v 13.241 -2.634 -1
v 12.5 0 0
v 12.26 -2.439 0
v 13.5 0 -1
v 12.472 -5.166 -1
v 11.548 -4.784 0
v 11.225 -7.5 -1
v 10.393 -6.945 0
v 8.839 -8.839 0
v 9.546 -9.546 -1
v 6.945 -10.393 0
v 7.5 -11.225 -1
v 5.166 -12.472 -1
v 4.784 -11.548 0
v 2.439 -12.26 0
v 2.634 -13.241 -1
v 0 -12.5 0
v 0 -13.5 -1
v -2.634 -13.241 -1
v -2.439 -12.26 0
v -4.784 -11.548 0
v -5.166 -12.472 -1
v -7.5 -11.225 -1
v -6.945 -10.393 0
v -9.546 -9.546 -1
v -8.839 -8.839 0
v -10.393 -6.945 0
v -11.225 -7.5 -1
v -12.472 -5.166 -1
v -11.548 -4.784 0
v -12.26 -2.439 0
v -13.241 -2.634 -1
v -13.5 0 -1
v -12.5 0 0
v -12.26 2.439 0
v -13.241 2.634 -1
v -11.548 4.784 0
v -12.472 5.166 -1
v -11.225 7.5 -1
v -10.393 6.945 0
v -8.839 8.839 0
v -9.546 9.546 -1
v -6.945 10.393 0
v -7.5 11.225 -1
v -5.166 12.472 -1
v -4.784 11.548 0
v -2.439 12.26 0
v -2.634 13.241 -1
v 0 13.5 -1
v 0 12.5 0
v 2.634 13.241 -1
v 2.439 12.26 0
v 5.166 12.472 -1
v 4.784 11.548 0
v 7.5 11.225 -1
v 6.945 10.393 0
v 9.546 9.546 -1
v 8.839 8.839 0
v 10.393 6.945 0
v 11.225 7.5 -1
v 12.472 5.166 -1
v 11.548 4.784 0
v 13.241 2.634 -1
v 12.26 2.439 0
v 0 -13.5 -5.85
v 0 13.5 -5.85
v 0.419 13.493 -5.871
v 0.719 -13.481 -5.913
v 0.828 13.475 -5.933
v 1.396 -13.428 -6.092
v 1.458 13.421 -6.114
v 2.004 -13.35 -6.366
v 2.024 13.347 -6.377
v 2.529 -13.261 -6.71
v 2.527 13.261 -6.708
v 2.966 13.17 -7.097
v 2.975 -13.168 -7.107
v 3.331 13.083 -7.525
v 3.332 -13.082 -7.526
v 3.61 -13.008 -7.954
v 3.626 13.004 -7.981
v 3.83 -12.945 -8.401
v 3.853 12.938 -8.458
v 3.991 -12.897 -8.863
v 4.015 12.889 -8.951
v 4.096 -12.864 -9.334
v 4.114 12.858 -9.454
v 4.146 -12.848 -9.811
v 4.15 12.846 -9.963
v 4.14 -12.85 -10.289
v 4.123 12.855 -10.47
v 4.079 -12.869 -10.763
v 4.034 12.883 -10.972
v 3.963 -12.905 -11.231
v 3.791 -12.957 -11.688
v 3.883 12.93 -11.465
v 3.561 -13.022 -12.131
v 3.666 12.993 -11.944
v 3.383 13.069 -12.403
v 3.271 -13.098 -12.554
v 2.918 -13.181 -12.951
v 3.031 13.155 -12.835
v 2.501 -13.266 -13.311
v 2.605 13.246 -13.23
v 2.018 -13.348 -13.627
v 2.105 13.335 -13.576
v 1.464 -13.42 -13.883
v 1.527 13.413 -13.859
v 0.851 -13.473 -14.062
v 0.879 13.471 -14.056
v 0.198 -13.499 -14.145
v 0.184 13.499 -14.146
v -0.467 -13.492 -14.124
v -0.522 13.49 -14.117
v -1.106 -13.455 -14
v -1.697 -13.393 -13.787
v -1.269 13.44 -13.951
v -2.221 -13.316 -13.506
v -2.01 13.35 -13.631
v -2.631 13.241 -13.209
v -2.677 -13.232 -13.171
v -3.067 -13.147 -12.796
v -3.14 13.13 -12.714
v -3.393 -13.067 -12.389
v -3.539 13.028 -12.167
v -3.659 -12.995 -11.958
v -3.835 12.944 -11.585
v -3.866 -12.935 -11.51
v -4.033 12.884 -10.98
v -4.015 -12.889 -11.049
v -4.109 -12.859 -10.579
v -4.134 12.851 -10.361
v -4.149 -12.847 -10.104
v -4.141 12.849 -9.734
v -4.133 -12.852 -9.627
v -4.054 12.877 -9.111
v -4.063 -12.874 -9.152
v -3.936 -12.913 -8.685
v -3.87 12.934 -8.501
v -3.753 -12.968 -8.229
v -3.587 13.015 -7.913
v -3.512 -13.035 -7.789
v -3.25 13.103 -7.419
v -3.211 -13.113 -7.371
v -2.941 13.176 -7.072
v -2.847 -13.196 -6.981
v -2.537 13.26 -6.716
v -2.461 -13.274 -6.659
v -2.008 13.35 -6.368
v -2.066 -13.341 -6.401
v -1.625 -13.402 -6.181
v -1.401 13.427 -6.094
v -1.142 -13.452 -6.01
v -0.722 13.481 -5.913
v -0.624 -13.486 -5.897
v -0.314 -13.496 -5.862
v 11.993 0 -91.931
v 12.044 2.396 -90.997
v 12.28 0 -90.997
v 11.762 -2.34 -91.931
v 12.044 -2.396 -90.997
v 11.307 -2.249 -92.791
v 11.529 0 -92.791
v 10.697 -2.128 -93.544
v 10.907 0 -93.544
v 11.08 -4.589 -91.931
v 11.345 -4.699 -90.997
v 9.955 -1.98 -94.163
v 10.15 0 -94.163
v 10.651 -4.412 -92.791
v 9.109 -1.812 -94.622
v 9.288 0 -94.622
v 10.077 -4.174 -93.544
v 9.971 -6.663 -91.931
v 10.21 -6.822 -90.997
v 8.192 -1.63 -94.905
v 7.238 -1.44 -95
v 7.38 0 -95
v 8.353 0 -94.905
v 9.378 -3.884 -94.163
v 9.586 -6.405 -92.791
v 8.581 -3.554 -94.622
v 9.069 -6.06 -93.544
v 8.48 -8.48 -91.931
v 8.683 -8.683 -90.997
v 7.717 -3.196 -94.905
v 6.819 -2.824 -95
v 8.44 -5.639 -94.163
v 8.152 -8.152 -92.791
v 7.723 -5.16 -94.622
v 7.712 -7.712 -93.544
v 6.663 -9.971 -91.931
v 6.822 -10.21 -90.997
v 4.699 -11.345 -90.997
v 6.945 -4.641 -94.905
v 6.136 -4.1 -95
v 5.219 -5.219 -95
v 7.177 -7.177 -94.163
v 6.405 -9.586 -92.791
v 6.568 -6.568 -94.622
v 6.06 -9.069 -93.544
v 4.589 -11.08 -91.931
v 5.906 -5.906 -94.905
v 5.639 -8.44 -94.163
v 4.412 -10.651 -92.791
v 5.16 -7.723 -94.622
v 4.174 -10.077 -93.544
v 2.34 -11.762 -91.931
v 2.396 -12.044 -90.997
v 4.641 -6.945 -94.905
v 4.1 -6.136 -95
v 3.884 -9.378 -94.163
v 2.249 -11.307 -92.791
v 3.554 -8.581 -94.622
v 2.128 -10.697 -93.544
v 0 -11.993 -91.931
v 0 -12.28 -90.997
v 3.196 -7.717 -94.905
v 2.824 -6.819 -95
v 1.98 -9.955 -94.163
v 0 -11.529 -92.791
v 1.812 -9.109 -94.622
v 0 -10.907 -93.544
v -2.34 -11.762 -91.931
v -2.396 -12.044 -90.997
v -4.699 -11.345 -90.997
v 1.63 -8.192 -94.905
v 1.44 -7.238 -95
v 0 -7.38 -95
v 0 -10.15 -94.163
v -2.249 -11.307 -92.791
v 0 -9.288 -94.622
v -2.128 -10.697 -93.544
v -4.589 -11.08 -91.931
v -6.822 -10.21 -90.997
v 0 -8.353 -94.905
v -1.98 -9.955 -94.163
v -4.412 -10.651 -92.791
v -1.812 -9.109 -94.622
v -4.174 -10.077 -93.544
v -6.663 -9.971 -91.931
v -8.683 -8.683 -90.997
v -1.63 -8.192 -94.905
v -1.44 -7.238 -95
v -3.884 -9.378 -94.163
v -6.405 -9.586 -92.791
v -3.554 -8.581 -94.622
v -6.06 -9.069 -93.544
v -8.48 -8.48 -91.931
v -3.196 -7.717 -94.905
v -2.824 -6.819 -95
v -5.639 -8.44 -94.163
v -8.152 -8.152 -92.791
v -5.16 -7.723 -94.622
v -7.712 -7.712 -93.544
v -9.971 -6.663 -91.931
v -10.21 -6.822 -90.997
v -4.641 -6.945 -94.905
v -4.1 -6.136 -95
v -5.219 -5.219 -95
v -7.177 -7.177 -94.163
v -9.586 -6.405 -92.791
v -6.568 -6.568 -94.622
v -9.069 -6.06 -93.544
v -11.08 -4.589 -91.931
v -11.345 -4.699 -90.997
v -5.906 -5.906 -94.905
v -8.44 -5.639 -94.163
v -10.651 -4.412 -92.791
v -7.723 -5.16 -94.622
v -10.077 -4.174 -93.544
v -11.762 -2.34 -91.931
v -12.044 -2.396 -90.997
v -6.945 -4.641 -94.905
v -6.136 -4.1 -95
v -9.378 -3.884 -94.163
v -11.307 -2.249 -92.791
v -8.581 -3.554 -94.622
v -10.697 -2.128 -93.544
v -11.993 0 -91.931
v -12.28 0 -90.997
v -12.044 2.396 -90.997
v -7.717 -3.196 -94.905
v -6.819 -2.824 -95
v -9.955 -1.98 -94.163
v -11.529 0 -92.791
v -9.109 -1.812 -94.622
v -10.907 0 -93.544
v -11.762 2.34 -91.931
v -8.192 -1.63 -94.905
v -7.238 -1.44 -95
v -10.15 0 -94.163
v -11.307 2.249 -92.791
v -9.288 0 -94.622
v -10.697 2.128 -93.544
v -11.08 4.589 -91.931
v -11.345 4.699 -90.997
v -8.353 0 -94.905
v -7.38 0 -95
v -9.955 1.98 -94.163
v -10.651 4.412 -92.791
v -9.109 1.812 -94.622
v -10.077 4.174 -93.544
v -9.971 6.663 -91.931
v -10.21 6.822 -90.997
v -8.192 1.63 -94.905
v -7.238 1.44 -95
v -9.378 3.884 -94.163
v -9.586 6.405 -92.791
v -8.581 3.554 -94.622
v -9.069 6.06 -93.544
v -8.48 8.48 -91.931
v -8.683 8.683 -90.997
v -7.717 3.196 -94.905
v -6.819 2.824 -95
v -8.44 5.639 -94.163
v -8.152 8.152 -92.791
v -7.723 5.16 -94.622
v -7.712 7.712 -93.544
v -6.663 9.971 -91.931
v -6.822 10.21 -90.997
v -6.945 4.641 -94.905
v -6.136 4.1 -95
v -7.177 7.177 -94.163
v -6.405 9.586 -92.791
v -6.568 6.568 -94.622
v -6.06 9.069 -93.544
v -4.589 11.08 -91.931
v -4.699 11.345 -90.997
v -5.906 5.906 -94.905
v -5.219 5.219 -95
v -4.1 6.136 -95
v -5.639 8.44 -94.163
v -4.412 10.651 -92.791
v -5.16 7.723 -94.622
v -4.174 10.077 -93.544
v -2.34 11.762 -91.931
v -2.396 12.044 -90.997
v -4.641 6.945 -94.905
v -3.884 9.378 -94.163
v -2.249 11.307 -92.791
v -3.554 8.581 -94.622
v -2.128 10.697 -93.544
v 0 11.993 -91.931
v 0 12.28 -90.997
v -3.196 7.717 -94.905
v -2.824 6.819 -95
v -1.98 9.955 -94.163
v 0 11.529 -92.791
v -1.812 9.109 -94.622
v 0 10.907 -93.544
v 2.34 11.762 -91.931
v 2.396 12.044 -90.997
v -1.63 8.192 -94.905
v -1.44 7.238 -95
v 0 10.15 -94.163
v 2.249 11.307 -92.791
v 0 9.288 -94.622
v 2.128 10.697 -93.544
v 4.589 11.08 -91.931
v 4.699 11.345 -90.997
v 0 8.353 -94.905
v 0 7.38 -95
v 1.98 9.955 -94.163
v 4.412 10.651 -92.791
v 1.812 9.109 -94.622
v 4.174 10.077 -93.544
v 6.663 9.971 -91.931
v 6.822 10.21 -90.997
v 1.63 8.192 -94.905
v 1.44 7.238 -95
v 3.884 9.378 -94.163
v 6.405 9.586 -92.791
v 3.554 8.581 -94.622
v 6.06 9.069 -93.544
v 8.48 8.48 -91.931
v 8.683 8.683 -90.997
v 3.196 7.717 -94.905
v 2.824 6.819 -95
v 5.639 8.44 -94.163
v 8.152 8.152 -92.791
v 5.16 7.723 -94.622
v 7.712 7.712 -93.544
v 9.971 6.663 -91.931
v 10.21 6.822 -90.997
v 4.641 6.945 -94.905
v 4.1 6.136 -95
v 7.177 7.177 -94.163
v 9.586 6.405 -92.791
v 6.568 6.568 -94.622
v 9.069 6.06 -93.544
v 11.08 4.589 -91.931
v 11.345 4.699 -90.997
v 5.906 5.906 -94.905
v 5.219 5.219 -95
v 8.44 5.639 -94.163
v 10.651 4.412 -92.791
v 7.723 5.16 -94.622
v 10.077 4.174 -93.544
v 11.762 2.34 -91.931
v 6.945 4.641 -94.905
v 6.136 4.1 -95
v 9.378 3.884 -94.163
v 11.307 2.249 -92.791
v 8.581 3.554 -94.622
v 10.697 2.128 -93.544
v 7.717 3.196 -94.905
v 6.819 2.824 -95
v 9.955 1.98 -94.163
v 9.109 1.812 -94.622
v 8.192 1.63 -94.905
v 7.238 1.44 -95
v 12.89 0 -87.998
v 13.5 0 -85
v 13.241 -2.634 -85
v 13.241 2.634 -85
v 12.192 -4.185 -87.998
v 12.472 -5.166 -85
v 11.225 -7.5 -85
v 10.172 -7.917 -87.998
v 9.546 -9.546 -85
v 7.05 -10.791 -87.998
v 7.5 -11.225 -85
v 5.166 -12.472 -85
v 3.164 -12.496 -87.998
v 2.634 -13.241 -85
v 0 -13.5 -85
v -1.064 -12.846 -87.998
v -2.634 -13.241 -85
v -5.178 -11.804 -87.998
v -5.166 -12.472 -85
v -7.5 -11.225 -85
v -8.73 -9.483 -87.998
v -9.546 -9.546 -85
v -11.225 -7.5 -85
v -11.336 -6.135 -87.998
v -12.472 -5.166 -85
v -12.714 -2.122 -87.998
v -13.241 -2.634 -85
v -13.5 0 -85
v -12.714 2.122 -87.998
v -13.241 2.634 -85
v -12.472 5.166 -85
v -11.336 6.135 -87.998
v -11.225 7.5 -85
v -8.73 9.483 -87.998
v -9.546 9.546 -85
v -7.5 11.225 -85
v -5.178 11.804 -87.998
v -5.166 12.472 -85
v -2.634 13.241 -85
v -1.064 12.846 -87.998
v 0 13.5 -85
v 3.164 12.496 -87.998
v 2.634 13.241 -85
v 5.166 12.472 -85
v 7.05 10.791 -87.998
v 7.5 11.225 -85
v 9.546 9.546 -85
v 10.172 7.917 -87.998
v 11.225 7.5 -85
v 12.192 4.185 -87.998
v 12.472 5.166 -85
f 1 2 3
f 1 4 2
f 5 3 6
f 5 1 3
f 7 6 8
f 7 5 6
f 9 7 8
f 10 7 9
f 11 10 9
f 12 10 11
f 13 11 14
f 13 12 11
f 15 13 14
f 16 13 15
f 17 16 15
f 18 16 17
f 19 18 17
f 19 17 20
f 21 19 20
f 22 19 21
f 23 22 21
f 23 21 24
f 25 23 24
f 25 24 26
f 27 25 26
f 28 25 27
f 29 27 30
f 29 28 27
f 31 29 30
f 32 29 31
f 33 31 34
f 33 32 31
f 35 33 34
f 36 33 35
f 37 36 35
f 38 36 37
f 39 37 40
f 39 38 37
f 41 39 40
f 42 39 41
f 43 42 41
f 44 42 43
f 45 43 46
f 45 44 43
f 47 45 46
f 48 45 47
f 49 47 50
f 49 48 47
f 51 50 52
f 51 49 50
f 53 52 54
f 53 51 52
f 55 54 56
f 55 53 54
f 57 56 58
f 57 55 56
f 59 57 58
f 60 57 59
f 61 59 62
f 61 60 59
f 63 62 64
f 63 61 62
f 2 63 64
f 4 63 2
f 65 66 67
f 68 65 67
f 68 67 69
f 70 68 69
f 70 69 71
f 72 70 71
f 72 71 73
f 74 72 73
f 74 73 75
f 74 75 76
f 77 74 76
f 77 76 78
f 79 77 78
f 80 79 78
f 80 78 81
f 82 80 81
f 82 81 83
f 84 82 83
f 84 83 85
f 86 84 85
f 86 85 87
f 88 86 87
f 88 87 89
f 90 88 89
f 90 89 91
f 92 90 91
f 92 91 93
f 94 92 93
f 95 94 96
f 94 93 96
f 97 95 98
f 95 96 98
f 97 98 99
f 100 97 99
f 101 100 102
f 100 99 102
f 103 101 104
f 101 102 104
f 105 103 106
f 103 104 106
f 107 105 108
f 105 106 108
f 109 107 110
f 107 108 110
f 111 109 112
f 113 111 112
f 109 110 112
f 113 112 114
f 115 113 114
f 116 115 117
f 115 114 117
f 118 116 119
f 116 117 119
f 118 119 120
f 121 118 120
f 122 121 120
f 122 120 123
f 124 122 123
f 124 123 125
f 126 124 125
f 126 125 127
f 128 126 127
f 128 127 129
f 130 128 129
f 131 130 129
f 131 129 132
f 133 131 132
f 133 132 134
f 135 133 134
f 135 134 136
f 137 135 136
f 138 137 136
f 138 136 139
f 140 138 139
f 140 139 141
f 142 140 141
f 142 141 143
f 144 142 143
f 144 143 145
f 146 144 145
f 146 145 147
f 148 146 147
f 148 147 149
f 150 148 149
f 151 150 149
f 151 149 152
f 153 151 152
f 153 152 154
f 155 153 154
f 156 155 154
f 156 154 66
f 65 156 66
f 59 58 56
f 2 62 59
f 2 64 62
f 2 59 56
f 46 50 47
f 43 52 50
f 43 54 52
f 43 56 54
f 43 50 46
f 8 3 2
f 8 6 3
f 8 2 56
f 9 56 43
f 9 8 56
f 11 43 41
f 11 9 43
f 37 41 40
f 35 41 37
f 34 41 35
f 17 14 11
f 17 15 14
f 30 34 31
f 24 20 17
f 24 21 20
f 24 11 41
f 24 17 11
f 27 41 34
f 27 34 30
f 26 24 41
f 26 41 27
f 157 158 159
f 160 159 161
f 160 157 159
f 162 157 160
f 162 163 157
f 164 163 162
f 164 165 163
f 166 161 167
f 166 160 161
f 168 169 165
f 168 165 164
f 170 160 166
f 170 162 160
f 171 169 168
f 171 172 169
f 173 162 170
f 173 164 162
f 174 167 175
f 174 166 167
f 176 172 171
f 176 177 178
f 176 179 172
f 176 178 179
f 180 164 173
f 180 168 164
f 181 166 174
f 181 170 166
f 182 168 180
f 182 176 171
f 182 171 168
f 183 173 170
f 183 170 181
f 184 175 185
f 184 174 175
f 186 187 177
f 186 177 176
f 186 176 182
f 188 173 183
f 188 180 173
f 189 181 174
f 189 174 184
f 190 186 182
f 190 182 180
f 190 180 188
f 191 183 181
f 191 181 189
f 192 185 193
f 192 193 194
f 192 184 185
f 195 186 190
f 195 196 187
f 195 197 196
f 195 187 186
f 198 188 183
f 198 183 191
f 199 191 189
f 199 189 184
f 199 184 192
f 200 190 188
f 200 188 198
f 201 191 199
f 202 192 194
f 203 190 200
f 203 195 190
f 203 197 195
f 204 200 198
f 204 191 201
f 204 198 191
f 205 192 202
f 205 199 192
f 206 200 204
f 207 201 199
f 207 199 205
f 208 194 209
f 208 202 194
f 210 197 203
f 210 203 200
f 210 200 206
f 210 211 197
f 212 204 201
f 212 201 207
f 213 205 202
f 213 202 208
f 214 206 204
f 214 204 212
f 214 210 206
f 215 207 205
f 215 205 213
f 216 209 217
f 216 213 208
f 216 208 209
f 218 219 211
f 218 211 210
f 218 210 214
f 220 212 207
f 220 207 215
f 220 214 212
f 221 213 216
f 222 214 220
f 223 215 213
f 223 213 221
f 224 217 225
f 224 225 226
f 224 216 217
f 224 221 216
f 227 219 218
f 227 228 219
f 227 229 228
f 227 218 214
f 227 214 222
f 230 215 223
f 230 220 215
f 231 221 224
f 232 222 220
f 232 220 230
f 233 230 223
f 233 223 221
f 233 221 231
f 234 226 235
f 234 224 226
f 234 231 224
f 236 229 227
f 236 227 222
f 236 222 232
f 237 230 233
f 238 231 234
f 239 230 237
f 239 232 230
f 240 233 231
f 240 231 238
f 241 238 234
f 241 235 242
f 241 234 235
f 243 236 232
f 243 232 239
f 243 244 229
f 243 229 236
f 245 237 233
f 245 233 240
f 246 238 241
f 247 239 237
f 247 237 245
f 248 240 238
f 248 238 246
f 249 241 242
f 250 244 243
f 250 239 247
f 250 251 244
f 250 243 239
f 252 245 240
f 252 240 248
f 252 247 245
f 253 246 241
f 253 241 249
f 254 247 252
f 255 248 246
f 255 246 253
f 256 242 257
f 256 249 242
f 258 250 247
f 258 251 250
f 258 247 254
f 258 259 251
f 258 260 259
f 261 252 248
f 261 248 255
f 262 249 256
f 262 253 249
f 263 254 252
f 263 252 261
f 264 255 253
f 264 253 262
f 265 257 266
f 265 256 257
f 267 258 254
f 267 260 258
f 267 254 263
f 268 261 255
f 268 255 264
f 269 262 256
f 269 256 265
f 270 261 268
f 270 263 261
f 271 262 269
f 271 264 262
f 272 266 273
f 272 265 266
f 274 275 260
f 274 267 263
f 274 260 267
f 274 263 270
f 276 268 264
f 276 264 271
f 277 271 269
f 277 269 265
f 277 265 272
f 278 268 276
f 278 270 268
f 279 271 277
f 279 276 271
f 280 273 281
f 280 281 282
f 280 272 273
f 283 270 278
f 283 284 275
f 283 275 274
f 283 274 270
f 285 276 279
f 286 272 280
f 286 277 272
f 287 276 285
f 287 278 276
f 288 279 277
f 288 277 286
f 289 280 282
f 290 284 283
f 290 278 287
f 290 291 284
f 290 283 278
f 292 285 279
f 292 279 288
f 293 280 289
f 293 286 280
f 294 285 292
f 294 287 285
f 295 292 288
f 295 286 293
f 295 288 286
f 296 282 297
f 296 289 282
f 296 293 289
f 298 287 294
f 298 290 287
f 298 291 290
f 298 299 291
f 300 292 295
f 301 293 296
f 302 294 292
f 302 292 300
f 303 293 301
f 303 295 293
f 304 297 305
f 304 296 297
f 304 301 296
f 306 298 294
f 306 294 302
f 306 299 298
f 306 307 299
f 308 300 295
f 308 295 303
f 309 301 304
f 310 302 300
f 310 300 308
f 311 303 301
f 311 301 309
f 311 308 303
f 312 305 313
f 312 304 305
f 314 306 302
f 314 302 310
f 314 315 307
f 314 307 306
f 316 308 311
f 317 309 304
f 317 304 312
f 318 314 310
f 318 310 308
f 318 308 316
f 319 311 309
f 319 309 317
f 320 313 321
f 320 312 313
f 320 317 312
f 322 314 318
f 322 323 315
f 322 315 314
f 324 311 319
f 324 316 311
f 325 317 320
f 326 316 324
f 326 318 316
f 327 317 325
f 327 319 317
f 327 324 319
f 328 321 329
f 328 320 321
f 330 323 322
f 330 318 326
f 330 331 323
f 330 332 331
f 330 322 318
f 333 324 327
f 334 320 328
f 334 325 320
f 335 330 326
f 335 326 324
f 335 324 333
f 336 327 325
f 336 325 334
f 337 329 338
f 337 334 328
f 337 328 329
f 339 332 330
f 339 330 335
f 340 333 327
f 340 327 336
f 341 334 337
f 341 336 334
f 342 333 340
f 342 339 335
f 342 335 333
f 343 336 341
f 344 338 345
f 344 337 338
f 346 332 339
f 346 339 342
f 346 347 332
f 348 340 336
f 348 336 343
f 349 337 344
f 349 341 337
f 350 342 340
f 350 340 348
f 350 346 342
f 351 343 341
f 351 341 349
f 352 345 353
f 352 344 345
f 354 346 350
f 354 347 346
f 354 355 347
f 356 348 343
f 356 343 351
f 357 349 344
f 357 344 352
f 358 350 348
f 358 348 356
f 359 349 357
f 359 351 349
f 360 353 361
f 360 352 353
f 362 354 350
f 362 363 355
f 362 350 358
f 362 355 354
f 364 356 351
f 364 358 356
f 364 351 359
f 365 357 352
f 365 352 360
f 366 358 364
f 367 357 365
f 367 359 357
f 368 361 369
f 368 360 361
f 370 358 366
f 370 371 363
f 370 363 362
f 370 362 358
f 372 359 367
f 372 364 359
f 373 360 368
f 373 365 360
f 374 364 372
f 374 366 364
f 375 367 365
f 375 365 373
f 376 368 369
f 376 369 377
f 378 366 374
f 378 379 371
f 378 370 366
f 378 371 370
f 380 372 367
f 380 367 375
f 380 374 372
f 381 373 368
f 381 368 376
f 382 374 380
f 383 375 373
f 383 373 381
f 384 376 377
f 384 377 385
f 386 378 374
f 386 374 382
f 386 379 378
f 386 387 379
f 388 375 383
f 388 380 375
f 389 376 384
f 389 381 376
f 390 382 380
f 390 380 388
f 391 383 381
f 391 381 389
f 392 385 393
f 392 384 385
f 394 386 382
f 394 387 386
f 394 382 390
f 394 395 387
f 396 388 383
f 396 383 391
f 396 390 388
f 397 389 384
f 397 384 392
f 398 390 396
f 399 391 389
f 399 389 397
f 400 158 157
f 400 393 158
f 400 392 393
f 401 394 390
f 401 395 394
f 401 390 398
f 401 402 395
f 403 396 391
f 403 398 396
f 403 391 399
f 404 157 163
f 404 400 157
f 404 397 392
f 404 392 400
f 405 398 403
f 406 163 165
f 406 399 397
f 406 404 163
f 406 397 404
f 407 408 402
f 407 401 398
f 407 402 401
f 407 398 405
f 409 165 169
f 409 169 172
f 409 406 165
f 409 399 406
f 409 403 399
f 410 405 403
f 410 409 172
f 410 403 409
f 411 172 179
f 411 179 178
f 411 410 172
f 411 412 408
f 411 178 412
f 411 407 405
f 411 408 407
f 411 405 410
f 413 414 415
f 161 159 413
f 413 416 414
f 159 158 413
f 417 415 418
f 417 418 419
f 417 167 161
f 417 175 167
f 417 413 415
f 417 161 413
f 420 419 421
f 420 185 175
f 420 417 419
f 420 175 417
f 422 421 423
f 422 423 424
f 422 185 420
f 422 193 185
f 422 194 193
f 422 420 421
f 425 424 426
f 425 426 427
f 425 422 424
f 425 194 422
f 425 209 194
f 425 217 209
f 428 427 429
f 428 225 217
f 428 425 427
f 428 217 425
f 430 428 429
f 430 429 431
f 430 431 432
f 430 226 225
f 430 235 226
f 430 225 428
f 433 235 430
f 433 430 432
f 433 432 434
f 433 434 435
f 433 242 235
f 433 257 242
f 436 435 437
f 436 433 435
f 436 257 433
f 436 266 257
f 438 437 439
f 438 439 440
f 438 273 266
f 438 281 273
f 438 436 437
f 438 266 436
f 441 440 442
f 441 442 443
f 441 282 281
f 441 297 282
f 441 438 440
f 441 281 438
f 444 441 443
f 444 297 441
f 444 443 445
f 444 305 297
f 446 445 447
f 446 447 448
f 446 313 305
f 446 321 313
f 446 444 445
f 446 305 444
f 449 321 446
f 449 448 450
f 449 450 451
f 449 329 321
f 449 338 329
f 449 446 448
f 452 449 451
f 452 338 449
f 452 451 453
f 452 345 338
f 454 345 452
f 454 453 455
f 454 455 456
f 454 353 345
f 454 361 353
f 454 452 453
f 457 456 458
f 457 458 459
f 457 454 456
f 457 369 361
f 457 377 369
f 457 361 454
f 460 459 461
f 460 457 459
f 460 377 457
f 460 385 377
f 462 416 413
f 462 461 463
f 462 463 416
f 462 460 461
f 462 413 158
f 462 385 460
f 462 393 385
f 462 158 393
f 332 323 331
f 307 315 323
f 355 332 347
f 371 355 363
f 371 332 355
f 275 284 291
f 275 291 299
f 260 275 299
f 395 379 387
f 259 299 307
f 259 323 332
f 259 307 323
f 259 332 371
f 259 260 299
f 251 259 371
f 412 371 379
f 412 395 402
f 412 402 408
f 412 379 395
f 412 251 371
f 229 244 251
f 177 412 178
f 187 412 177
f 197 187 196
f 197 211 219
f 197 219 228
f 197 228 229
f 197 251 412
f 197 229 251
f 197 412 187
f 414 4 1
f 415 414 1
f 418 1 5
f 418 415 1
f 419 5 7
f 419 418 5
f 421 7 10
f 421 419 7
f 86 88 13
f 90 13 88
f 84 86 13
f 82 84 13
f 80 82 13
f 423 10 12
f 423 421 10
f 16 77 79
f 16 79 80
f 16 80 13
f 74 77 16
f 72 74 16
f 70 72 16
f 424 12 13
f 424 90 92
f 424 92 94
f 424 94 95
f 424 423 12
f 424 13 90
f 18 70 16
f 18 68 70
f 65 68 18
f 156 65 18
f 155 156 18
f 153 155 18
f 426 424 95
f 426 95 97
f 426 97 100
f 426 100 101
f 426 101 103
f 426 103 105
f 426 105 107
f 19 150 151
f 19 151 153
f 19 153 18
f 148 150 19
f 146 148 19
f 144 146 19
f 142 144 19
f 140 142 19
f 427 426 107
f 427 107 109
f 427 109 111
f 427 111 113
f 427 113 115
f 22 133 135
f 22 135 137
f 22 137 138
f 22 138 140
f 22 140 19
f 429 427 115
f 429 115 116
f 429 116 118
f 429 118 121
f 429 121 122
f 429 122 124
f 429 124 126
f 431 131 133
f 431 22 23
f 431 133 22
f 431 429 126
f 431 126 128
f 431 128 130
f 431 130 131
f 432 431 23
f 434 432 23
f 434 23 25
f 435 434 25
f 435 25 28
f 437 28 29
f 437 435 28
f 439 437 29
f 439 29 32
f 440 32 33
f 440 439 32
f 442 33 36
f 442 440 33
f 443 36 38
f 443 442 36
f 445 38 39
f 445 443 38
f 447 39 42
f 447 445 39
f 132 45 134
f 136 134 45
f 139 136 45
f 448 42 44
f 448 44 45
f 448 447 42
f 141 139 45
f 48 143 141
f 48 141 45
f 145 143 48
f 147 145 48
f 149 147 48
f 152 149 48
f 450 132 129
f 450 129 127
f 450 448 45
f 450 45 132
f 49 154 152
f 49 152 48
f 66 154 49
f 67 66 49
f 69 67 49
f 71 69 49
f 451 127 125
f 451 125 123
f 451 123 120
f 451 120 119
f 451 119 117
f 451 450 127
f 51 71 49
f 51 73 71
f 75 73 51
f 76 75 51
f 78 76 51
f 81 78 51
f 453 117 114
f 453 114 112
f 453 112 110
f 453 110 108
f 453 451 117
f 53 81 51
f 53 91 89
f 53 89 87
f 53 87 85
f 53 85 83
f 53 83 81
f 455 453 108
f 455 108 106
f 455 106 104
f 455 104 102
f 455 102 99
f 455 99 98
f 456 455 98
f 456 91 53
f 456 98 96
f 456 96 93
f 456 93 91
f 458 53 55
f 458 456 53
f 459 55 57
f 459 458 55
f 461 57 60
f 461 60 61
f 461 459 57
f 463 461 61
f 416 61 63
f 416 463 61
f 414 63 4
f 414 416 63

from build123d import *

# Parameters (mm, degrees)
CUT_EXTRUDE_1_REACH = 29
SKETCH_2_R          = 4.15


with BuildPart() as part:
    # 스케치1 → 회전1 (revolve)
    with BuildSketch(Plane(origin=(0, 0, 0), x_dir=(0, 0, -1), z_dir=(1, 0, 0)), mode=Mode.PRIVATE) as revolve_1_sk:
        with BuildLine():
            Line((1, 13.5), (85, 13.5))
            Line((85, 13.5), (90.996839672, 12.279929179))
            ThreePointArc((90.996839672, 12.279929179), (93.87196322, 10.543832299), (95, 7.380305656))
            Line((95, 7.380305656), (95, 0))
            Line((95, 0), (0, 0))
            Line((0, 0), (0, 12.5))
            Line((0, 12.5), (1, 13.5))
        make_face()
    revolve(revolve_1_sk.sketch.rotate(Axis((0, 0, 0), (0, 0, -1)), 90), axis=Axis((0, 0, 0), (0, 0, -1)))  # turned: the seam where the file's is

    # 스케치2 → 컷-돌출1 (cut, up to next)
    with BuildSketch(Plane(origin=(0, 13.5, 0), x_dir=(1, 0, 0), z_dir=(0, 1, 0)), mode=Mode.PRIVATE) as cut_extrude_1_sk1:
        with Locations(Location((0, 10, 0), (0, 0, 270))):  # turned: the seam where the file's is
            Circle(SKETCH_2_R)
    cut_extrude_1_tool1 = extrude(cut_extrude_1_sk1.sketch, amount=-CUT_EXTRUDE_1_REACH, mode=Mode.PRIVATE) & part.part
    add(cut_extrude_1_tool1.solids().sort_by_distance((0, 13.5, -10))[0], mode=Mode.SUBTRACT)


solid = part.part
